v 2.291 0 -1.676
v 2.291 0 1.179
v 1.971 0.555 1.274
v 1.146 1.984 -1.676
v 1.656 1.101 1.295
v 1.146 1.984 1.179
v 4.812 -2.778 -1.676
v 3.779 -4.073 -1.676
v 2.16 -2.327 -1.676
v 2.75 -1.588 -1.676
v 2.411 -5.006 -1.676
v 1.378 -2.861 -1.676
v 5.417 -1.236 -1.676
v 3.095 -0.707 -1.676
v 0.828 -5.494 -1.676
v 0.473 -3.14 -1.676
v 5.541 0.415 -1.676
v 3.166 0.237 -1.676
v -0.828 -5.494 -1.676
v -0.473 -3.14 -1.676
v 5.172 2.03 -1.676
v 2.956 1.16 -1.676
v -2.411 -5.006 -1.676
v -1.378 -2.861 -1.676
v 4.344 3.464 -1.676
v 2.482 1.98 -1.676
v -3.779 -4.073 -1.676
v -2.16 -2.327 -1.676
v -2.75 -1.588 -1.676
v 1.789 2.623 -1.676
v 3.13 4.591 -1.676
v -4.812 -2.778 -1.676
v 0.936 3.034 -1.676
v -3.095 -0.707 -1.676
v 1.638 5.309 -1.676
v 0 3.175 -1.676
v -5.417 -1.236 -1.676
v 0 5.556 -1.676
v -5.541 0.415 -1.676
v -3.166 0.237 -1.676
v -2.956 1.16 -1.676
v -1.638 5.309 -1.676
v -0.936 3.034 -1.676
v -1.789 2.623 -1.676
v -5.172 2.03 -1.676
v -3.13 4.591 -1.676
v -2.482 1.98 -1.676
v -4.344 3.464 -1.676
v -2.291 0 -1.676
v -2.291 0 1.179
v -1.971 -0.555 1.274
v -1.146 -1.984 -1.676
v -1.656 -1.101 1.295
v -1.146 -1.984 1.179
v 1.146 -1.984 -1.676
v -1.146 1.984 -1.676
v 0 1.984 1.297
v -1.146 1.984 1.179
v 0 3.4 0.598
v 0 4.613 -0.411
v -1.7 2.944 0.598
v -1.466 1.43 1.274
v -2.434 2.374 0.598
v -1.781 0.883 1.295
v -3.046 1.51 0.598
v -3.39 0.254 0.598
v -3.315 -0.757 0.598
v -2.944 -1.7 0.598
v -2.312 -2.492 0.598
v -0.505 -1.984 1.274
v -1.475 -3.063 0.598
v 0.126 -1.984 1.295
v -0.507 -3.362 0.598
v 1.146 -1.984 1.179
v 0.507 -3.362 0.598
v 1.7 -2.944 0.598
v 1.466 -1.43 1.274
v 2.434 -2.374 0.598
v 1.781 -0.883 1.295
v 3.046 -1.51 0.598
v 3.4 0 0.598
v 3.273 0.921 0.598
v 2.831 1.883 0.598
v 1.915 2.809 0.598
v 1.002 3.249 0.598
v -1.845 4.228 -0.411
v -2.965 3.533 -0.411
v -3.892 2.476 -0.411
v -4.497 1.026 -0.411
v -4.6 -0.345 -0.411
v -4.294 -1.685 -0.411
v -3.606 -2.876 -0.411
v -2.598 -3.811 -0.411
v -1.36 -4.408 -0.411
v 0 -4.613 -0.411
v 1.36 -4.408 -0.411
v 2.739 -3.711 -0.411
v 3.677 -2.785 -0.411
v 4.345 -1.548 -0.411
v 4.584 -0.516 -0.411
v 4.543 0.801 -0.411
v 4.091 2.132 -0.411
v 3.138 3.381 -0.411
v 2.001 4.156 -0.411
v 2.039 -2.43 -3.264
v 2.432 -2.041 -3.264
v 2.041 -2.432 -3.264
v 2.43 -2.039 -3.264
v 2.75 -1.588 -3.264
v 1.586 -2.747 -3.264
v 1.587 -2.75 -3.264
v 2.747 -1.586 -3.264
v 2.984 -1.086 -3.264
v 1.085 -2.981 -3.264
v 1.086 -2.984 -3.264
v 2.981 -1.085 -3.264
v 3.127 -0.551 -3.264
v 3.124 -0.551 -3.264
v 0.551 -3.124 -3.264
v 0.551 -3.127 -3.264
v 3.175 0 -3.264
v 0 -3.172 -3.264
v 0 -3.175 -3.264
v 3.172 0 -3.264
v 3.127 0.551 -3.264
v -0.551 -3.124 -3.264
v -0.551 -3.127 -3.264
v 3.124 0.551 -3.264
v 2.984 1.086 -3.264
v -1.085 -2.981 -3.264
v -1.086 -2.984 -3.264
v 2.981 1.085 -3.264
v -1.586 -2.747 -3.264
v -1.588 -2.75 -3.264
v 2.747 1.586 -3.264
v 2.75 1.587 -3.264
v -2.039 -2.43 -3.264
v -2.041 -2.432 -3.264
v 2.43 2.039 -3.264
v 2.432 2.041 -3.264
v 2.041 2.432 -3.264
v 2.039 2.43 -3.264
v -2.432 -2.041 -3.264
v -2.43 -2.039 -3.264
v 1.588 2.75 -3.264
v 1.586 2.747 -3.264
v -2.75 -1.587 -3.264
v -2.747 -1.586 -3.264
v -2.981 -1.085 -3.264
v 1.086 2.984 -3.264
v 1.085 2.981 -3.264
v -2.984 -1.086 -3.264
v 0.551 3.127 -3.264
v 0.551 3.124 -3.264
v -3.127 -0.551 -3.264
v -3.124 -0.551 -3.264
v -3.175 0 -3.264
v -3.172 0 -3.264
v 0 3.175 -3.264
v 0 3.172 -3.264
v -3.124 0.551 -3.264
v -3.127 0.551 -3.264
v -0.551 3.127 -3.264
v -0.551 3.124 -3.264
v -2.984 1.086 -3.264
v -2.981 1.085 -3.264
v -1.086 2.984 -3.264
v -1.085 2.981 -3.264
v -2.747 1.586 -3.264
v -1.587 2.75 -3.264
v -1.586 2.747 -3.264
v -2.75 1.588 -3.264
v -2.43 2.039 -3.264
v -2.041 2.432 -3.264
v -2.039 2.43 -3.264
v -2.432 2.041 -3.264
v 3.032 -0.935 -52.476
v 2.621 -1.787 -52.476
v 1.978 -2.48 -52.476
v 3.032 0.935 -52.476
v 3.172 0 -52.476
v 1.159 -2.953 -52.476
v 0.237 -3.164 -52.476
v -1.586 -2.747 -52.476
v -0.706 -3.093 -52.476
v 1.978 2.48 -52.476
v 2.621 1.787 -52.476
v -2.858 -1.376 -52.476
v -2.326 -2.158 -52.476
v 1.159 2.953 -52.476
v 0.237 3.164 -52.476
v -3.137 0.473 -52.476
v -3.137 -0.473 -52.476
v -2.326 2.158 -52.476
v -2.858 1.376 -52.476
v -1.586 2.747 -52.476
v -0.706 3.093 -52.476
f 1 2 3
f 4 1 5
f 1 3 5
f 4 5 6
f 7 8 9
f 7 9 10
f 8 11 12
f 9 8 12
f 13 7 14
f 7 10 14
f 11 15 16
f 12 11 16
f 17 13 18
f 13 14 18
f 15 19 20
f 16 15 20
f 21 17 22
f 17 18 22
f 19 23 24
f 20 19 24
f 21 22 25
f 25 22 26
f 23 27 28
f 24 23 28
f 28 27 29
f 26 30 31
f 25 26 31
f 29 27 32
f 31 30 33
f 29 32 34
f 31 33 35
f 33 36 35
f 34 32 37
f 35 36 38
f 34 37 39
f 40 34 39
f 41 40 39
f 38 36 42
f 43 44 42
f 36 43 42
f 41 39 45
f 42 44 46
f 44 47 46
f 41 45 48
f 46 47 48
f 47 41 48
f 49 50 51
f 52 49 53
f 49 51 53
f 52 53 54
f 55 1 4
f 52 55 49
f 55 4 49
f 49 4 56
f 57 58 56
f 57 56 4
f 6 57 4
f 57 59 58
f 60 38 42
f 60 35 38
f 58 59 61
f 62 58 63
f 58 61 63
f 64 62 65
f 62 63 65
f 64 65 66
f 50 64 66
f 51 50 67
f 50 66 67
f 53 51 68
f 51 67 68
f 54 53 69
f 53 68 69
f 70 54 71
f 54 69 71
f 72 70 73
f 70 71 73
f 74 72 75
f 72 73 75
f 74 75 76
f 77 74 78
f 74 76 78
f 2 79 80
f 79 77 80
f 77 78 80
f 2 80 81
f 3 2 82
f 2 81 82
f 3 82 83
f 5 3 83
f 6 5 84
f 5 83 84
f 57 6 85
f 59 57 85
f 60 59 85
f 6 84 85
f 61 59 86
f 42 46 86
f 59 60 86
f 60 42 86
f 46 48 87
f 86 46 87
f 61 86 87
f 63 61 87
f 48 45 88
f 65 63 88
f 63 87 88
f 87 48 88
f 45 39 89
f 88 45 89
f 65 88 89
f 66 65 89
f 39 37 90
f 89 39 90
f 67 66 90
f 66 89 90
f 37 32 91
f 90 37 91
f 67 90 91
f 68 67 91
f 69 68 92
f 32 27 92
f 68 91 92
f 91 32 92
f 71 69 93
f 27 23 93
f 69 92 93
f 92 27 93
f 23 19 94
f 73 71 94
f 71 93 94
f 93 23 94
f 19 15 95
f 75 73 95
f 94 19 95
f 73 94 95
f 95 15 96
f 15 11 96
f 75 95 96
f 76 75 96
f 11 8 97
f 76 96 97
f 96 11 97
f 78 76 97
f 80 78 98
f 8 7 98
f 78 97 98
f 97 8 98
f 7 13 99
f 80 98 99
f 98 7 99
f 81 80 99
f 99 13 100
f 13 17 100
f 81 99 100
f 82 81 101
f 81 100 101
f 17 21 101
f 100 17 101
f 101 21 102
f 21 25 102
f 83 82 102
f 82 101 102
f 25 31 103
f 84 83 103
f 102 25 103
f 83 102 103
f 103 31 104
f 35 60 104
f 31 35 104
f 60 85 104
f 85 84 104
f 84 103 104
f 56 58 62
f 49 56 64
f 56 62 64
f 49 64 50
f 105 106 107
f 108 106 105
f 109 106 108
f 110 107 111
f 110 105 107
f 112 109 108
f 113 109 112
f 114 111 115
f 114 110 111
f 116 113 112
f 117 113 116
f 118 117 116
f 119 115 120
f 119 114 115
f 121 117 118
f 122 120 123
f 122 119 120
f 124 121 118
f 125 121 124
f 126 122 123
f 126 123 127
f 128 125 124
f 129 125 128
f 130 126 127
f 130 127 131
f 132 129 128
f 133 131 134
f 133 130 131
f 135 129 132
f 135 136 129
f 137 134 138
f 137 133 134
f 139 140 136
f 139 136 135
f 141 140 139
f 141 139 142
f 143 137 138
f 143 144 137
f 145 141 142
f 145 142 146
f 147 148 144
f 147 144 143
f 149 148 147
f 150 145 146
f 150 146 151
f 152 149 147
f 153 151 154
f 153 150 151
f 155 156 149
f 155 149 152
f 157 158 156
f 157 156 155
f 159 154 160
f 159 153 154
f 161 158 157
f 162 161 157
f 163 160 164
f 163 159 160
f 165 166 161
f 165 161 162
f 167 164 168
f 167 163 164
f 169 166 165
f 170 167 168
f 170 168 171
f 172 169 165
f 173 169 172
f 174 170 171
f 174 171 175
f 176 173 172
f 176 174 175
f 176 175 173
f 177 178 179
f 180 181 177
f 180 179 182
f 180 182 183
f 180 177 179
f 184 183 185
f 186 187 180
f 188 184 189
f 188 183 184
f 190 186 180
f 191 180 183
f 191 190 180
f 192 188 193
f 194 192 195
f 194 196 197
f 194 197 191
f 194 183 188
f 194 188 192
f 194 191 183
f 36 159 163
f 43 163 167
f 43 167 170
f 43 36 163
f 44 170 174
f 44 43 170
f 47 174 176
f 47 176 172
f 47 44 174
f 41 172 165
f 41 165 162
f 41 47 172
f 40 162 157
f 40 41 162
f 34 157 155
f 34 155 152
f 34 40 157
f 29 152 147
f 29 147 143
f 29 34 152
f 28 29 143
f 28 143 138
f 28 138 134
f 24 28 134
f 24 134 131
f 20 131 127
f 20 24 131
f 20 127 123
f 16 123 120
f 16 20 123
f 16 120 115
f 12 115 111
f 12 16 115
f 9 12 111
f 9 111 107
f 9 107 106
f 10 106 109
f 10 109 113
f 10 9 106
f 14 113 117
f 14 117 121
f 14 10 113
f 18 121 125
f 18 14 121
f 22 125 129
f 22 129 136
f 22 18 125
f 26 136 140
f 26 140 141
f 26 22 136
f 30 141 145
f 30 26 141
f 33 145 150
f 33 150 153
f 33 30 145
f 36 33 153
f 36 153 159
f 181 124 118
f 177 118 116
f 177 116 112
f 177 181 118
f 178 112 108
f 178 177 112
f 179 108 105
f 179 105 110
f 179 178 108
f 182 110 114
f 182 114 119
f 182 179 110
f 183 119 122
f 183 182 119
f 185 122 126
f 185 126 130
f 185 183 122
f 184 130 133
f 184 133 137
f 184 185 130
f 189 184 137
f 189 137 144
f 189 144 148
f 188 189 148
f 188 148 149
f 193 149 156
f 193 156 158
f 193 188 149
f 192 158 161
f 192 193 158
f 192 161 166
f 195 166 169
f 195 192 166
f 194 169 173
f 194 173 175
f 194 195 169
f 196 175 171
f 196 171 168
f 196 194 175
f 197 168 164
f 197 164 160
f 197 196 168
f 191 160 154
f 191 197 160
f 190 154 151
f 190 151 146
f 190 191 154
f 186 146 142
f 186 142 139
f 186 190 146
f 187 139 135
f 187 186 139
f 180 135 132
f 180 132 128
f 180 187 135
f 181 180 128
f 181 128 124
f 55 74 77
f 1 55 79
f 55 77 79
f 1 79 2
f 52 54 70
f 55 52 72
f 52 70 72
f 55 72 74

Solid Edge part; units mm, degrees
sketch "Sketch1" plane through (0, 0, 0) normal (1, 0, 0) x (0, 1, 0)
  line L0 (0, -1.6764) -> (0, 1.6764)
  arc A0 (0, 1.6764) -> (5.55625, -1.6764) centre (-0.25374, -5.024398) cw
  line L1 (0, -1.6764) -> (5.55625, -1.6764)
  dimension "D1" = 3.3528
  dimension "D2" = 6.7056
revolve "RevolvedProtrusion1" add sketch "Sketch1" angle 360 about axis through (0, 0, -14.779625) along (0, 0, 1)
sketch "Sketch2" plane through (0, 0, -1.6764) normal (0, 0, -1) x (0, 1, 0)
  circle A0 centre (0, 0) radius 3.175
  dimension "D1" = 6.35
extrude "Protrusion1" add sketch "Sketch2" along normal blind 50.8
sketch "Sketch3" plane through (0, 0, -52.4764) normal (0, 0, -1) x (1, 0, 0)
  circle A0 centre (0, 0) radius 3.17246
  dimension "D1" = 0.0025
extrude "Cutout1" cut sketch "Sketch3" against normal blind 49.2125 flip side to cut
sketch "Sketch4" plane through (-0.603226, 0.360624, 3.3528) normal (0, 0, 1) x (1, 0, 0)
  line L0 (-0.542454, 1.623751) -> (1.748905, 1.623751)
  line L1 (2.894585, -0.360624) -> (1.748905, 1.623751)
  line L2 (1.748905, -2.344999) -> (2.894585, -0.360624)
  line L3 (-0.542454, -2.344999) -> (1.748905, -2.344999)
  line L4 (-1.688133, -0.360624) -> (-0.542454, -2.344999)
  line L5 (-0.542454, 1.623751) -> (-1.688133, -0.360624)
extrude "ExtrudedCutout_11" cut sketch "Sketch4" against normal blind 5.0292
properties part number "24100156"
